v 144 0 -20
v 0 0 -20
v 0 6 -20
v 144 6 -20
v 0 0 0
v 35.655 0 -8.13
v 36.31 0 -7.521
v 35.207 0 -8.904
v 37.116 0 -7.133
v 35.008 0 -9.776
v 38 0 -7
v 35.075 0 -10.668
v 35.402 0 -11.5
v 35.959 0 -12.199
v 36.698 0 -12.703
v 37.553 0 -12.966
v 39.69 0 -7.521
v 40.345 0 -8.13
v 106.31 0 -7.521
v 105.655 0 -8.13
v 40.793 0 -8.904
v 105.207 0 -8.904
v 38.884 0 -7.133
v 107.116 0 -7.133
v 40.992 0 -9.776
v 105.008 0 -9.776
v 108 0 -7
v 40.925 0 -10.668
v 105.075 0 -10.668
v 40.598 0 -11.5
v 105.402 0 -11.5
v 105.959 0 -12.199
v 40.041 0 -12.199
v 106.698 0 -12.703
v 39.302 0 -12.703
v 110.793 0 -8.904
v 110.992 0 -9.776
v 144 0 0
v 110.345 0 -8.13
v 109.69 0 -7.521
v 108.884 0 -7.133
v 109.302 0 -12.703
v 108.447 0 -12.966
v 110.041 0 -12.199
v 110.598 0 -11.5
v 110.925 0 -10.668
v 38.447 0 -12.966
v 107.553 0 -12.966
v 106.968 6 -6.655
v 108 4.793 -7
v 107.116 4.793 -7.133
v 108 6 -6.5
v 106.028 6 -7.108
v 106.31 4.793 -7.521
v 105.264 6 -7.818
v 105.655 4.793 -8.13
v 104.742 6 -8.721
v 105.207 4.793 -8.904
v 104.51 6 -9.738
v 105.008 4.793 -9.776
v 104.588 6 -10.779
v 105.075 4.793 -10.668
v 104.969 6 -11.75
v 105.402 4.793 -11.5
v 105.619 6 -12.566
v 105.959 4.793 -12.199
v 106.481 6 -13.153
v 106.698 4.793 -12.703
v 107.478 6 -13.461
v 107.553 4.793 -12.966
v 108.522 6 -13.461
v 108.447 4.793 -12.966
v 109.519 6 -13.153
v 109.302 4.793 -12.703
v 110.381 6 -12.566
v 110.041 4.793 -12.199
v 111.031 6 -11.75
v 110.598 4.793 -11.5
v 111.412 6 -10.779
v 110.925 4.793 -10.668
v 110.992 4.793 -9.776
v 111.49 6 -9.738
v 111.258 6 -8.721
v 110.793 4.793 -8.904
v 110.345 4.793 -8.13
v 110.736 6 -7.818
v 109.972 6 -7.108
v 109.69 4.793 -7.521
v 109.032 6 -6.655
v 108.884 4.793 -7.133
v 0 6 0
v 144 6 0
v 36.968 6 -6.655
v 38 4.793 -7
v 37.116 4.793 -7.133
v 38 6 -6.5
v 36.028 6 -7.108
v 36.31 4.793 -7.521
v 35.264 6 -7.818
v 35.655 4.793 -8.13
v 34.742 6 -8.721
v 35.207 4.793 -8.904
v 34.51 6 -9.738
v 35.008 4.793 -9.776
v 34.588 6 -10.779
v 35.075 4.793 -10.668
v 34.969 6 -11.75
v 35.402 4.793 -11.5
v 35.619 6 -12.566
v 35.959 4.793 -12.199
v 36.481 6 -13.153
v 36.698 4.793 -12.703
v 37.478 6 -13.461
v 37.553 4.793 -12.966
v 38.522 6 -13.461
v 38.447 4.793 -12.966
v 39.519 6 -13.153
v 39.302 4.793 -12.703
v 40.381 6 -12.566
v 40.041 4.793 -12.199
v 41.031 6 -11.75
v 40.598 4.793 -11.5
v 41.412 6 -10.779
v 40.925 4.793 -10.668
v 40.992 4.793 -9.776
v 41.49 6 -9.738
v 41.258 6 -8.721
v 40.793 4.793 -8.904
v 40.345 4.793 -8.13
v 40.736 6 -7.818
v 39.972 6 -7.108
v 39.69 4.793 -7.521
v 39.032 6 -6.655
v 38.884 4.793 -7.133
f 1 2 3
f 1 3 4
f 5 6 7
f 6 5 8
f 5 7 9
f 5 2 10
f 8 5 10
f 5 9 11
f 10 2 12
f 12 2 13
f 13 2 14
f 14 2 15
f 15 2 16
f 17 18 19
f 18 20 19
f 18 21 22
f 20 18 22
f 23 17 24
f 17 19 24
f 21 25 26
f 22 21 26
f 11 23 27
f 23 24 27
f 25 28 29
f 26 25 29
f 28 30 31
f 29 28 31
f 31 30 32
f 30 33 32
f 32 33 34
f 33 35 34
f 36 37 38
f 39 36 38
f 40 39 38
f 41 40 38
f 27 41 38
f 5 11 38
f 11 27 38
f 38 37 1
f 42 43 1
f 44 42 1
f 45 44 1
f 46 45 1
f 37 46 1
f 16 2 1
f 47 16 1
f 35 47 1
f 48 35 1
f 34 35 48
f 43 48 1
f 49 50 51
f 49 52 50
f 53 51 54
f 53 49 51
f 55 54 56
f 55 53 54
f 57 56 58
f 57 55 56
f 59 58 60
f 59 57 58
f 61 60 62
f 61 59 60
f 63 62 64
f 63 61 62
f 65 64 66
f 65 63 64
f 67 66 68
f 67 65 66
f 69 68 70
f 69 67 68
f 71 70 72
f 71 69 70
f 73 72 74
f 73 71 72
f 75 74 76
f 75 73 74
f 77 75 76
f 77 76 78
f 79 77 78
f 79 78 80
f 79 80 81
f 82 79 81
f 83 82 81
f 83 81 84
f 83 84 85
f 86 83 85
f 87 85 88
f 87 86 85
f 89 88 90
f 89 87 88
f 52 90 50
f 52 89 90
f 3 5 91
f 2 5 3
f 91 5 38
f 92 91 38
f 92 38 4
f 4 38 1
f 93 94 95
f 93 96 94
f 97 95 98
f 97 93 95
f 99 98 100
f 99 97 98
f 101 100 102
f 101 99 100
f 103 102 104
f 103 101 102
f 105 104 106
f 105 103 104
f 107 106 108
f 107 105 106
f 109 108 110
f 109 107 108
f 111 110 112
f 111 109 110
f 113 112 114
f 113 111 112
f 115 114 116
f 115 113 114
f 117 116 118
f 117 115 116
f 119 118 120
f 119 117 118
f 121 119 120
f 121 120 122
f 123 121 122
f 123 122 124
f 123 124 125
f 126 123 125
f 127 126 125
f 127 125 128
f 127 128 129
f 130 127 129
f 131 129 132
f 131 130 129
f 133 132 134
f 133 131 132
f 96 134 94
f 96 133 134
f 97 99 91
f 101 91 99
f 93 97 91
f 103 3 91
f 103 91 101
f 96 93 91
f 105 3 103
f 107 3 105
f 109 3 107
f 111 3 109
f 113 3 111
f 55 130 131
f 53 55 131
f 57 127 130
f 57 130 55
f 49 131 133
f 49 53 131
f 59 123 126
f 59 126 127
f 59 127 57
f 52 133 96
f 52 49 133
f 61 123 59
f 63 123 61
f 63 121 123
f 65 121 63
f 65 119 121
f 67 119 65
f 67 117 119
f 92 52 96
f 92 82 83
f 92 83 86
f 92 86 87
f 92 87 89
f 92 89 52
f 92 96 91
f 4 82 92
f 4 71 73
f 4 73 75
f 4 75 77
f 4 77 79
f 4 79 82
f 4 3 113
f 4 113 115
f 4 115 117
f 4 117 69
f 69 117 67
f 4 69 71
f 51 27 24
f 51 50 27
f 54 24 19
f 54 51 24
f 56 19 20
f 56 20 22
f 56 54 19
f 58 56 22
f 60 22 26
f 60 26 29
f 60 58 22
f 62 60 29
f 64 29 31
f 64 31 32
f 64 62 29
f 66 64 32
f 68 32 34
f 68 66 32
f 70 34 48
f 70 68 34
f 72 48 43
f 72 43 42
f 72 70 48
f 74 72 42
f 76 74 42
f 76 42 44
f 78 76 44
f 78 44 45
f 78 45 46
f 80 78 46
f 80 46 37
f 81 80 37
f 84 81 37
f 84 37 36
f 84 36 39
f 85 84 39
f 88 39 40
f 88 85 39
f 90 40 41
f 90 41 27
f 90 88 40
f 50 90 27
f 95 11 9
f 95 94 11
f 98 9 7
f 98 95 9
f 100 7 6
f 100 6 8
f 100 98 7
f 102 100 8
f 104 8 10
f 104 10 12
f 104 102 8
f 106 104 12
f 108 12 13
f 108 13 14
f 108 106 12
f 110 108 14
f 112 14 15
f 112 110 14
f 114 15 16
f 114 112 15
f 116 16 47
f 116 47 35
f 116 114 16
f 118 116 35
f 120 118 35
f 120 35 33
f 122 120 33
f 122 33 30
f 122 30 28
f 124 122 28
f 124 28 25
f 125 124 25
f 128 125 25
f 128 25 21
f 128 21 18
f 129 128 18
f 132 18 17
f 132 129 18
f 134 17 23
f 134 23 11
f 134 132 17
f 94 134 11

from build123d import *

# Parameters (mm, degrees)
SKETCH2_W                                      = 144
SKETCH2_H                                      = 20
BOSS_EXTRUDE1_DEPTH                            = 6
CSK_FOR_M2_FLAT_HEAD_MACHINE_SCREW2_AT_2_COUNT = 2
CSK_FOR_M2_FLAT_HEAD_MACHINE_SCREW2_AT_2_PITCH = 70


with BuildPart() as part:
    # Sketch2 → Boss-Extrude1 (new body)
    with BuildSketch(Plane(origin=(0, 0, 0), x_dir=(1, 0, 0), z_dir=(0, 1, 0))):
        with Locations((72, 10)):
            Rectangle(SKETCH2_W, SKETCH2_H)
    extrude(amount=BOSS_EXTRUDE1_DEPTH)

    # Sketch6 → CSK for M2 Flat Head Machine Screw2 (revolve, cut)
    with BuildSketch(Plane(origin=(38, 6, -10), x_dir=(0, 0, 1), z_dir=(1, 0, 0))):
        Polygon((0, 0), (0, 6), (3, 6), (3, 1.207106781), (3.5, 0), align=None)
    csk_for_m2_flat_head_machine_screw2 = revolve(axis=Axis((38, 12.35, -10), (0, -1, 0)), mode=Mode.SUBTRACT)

    # CSK for M2 Flat Head Machine Screw2 at 2: CSK for M2 Flat Head Machine Screw2 ×2
    with Locations(*[(i * CSK_FOR_M2_FLAT_HEAD_MACHINE_SCREW2_AT_2_PITCH, 0, 0) for i in range(1, CSK_FOR_M2_FLAT_HEAD_MACHINE_SCREW2_AT_2_COUNT)]):
        add(csk_for_m2_flat_head_machine_screw2, mode=Mode.SUBTRACT)


solid = part.part
